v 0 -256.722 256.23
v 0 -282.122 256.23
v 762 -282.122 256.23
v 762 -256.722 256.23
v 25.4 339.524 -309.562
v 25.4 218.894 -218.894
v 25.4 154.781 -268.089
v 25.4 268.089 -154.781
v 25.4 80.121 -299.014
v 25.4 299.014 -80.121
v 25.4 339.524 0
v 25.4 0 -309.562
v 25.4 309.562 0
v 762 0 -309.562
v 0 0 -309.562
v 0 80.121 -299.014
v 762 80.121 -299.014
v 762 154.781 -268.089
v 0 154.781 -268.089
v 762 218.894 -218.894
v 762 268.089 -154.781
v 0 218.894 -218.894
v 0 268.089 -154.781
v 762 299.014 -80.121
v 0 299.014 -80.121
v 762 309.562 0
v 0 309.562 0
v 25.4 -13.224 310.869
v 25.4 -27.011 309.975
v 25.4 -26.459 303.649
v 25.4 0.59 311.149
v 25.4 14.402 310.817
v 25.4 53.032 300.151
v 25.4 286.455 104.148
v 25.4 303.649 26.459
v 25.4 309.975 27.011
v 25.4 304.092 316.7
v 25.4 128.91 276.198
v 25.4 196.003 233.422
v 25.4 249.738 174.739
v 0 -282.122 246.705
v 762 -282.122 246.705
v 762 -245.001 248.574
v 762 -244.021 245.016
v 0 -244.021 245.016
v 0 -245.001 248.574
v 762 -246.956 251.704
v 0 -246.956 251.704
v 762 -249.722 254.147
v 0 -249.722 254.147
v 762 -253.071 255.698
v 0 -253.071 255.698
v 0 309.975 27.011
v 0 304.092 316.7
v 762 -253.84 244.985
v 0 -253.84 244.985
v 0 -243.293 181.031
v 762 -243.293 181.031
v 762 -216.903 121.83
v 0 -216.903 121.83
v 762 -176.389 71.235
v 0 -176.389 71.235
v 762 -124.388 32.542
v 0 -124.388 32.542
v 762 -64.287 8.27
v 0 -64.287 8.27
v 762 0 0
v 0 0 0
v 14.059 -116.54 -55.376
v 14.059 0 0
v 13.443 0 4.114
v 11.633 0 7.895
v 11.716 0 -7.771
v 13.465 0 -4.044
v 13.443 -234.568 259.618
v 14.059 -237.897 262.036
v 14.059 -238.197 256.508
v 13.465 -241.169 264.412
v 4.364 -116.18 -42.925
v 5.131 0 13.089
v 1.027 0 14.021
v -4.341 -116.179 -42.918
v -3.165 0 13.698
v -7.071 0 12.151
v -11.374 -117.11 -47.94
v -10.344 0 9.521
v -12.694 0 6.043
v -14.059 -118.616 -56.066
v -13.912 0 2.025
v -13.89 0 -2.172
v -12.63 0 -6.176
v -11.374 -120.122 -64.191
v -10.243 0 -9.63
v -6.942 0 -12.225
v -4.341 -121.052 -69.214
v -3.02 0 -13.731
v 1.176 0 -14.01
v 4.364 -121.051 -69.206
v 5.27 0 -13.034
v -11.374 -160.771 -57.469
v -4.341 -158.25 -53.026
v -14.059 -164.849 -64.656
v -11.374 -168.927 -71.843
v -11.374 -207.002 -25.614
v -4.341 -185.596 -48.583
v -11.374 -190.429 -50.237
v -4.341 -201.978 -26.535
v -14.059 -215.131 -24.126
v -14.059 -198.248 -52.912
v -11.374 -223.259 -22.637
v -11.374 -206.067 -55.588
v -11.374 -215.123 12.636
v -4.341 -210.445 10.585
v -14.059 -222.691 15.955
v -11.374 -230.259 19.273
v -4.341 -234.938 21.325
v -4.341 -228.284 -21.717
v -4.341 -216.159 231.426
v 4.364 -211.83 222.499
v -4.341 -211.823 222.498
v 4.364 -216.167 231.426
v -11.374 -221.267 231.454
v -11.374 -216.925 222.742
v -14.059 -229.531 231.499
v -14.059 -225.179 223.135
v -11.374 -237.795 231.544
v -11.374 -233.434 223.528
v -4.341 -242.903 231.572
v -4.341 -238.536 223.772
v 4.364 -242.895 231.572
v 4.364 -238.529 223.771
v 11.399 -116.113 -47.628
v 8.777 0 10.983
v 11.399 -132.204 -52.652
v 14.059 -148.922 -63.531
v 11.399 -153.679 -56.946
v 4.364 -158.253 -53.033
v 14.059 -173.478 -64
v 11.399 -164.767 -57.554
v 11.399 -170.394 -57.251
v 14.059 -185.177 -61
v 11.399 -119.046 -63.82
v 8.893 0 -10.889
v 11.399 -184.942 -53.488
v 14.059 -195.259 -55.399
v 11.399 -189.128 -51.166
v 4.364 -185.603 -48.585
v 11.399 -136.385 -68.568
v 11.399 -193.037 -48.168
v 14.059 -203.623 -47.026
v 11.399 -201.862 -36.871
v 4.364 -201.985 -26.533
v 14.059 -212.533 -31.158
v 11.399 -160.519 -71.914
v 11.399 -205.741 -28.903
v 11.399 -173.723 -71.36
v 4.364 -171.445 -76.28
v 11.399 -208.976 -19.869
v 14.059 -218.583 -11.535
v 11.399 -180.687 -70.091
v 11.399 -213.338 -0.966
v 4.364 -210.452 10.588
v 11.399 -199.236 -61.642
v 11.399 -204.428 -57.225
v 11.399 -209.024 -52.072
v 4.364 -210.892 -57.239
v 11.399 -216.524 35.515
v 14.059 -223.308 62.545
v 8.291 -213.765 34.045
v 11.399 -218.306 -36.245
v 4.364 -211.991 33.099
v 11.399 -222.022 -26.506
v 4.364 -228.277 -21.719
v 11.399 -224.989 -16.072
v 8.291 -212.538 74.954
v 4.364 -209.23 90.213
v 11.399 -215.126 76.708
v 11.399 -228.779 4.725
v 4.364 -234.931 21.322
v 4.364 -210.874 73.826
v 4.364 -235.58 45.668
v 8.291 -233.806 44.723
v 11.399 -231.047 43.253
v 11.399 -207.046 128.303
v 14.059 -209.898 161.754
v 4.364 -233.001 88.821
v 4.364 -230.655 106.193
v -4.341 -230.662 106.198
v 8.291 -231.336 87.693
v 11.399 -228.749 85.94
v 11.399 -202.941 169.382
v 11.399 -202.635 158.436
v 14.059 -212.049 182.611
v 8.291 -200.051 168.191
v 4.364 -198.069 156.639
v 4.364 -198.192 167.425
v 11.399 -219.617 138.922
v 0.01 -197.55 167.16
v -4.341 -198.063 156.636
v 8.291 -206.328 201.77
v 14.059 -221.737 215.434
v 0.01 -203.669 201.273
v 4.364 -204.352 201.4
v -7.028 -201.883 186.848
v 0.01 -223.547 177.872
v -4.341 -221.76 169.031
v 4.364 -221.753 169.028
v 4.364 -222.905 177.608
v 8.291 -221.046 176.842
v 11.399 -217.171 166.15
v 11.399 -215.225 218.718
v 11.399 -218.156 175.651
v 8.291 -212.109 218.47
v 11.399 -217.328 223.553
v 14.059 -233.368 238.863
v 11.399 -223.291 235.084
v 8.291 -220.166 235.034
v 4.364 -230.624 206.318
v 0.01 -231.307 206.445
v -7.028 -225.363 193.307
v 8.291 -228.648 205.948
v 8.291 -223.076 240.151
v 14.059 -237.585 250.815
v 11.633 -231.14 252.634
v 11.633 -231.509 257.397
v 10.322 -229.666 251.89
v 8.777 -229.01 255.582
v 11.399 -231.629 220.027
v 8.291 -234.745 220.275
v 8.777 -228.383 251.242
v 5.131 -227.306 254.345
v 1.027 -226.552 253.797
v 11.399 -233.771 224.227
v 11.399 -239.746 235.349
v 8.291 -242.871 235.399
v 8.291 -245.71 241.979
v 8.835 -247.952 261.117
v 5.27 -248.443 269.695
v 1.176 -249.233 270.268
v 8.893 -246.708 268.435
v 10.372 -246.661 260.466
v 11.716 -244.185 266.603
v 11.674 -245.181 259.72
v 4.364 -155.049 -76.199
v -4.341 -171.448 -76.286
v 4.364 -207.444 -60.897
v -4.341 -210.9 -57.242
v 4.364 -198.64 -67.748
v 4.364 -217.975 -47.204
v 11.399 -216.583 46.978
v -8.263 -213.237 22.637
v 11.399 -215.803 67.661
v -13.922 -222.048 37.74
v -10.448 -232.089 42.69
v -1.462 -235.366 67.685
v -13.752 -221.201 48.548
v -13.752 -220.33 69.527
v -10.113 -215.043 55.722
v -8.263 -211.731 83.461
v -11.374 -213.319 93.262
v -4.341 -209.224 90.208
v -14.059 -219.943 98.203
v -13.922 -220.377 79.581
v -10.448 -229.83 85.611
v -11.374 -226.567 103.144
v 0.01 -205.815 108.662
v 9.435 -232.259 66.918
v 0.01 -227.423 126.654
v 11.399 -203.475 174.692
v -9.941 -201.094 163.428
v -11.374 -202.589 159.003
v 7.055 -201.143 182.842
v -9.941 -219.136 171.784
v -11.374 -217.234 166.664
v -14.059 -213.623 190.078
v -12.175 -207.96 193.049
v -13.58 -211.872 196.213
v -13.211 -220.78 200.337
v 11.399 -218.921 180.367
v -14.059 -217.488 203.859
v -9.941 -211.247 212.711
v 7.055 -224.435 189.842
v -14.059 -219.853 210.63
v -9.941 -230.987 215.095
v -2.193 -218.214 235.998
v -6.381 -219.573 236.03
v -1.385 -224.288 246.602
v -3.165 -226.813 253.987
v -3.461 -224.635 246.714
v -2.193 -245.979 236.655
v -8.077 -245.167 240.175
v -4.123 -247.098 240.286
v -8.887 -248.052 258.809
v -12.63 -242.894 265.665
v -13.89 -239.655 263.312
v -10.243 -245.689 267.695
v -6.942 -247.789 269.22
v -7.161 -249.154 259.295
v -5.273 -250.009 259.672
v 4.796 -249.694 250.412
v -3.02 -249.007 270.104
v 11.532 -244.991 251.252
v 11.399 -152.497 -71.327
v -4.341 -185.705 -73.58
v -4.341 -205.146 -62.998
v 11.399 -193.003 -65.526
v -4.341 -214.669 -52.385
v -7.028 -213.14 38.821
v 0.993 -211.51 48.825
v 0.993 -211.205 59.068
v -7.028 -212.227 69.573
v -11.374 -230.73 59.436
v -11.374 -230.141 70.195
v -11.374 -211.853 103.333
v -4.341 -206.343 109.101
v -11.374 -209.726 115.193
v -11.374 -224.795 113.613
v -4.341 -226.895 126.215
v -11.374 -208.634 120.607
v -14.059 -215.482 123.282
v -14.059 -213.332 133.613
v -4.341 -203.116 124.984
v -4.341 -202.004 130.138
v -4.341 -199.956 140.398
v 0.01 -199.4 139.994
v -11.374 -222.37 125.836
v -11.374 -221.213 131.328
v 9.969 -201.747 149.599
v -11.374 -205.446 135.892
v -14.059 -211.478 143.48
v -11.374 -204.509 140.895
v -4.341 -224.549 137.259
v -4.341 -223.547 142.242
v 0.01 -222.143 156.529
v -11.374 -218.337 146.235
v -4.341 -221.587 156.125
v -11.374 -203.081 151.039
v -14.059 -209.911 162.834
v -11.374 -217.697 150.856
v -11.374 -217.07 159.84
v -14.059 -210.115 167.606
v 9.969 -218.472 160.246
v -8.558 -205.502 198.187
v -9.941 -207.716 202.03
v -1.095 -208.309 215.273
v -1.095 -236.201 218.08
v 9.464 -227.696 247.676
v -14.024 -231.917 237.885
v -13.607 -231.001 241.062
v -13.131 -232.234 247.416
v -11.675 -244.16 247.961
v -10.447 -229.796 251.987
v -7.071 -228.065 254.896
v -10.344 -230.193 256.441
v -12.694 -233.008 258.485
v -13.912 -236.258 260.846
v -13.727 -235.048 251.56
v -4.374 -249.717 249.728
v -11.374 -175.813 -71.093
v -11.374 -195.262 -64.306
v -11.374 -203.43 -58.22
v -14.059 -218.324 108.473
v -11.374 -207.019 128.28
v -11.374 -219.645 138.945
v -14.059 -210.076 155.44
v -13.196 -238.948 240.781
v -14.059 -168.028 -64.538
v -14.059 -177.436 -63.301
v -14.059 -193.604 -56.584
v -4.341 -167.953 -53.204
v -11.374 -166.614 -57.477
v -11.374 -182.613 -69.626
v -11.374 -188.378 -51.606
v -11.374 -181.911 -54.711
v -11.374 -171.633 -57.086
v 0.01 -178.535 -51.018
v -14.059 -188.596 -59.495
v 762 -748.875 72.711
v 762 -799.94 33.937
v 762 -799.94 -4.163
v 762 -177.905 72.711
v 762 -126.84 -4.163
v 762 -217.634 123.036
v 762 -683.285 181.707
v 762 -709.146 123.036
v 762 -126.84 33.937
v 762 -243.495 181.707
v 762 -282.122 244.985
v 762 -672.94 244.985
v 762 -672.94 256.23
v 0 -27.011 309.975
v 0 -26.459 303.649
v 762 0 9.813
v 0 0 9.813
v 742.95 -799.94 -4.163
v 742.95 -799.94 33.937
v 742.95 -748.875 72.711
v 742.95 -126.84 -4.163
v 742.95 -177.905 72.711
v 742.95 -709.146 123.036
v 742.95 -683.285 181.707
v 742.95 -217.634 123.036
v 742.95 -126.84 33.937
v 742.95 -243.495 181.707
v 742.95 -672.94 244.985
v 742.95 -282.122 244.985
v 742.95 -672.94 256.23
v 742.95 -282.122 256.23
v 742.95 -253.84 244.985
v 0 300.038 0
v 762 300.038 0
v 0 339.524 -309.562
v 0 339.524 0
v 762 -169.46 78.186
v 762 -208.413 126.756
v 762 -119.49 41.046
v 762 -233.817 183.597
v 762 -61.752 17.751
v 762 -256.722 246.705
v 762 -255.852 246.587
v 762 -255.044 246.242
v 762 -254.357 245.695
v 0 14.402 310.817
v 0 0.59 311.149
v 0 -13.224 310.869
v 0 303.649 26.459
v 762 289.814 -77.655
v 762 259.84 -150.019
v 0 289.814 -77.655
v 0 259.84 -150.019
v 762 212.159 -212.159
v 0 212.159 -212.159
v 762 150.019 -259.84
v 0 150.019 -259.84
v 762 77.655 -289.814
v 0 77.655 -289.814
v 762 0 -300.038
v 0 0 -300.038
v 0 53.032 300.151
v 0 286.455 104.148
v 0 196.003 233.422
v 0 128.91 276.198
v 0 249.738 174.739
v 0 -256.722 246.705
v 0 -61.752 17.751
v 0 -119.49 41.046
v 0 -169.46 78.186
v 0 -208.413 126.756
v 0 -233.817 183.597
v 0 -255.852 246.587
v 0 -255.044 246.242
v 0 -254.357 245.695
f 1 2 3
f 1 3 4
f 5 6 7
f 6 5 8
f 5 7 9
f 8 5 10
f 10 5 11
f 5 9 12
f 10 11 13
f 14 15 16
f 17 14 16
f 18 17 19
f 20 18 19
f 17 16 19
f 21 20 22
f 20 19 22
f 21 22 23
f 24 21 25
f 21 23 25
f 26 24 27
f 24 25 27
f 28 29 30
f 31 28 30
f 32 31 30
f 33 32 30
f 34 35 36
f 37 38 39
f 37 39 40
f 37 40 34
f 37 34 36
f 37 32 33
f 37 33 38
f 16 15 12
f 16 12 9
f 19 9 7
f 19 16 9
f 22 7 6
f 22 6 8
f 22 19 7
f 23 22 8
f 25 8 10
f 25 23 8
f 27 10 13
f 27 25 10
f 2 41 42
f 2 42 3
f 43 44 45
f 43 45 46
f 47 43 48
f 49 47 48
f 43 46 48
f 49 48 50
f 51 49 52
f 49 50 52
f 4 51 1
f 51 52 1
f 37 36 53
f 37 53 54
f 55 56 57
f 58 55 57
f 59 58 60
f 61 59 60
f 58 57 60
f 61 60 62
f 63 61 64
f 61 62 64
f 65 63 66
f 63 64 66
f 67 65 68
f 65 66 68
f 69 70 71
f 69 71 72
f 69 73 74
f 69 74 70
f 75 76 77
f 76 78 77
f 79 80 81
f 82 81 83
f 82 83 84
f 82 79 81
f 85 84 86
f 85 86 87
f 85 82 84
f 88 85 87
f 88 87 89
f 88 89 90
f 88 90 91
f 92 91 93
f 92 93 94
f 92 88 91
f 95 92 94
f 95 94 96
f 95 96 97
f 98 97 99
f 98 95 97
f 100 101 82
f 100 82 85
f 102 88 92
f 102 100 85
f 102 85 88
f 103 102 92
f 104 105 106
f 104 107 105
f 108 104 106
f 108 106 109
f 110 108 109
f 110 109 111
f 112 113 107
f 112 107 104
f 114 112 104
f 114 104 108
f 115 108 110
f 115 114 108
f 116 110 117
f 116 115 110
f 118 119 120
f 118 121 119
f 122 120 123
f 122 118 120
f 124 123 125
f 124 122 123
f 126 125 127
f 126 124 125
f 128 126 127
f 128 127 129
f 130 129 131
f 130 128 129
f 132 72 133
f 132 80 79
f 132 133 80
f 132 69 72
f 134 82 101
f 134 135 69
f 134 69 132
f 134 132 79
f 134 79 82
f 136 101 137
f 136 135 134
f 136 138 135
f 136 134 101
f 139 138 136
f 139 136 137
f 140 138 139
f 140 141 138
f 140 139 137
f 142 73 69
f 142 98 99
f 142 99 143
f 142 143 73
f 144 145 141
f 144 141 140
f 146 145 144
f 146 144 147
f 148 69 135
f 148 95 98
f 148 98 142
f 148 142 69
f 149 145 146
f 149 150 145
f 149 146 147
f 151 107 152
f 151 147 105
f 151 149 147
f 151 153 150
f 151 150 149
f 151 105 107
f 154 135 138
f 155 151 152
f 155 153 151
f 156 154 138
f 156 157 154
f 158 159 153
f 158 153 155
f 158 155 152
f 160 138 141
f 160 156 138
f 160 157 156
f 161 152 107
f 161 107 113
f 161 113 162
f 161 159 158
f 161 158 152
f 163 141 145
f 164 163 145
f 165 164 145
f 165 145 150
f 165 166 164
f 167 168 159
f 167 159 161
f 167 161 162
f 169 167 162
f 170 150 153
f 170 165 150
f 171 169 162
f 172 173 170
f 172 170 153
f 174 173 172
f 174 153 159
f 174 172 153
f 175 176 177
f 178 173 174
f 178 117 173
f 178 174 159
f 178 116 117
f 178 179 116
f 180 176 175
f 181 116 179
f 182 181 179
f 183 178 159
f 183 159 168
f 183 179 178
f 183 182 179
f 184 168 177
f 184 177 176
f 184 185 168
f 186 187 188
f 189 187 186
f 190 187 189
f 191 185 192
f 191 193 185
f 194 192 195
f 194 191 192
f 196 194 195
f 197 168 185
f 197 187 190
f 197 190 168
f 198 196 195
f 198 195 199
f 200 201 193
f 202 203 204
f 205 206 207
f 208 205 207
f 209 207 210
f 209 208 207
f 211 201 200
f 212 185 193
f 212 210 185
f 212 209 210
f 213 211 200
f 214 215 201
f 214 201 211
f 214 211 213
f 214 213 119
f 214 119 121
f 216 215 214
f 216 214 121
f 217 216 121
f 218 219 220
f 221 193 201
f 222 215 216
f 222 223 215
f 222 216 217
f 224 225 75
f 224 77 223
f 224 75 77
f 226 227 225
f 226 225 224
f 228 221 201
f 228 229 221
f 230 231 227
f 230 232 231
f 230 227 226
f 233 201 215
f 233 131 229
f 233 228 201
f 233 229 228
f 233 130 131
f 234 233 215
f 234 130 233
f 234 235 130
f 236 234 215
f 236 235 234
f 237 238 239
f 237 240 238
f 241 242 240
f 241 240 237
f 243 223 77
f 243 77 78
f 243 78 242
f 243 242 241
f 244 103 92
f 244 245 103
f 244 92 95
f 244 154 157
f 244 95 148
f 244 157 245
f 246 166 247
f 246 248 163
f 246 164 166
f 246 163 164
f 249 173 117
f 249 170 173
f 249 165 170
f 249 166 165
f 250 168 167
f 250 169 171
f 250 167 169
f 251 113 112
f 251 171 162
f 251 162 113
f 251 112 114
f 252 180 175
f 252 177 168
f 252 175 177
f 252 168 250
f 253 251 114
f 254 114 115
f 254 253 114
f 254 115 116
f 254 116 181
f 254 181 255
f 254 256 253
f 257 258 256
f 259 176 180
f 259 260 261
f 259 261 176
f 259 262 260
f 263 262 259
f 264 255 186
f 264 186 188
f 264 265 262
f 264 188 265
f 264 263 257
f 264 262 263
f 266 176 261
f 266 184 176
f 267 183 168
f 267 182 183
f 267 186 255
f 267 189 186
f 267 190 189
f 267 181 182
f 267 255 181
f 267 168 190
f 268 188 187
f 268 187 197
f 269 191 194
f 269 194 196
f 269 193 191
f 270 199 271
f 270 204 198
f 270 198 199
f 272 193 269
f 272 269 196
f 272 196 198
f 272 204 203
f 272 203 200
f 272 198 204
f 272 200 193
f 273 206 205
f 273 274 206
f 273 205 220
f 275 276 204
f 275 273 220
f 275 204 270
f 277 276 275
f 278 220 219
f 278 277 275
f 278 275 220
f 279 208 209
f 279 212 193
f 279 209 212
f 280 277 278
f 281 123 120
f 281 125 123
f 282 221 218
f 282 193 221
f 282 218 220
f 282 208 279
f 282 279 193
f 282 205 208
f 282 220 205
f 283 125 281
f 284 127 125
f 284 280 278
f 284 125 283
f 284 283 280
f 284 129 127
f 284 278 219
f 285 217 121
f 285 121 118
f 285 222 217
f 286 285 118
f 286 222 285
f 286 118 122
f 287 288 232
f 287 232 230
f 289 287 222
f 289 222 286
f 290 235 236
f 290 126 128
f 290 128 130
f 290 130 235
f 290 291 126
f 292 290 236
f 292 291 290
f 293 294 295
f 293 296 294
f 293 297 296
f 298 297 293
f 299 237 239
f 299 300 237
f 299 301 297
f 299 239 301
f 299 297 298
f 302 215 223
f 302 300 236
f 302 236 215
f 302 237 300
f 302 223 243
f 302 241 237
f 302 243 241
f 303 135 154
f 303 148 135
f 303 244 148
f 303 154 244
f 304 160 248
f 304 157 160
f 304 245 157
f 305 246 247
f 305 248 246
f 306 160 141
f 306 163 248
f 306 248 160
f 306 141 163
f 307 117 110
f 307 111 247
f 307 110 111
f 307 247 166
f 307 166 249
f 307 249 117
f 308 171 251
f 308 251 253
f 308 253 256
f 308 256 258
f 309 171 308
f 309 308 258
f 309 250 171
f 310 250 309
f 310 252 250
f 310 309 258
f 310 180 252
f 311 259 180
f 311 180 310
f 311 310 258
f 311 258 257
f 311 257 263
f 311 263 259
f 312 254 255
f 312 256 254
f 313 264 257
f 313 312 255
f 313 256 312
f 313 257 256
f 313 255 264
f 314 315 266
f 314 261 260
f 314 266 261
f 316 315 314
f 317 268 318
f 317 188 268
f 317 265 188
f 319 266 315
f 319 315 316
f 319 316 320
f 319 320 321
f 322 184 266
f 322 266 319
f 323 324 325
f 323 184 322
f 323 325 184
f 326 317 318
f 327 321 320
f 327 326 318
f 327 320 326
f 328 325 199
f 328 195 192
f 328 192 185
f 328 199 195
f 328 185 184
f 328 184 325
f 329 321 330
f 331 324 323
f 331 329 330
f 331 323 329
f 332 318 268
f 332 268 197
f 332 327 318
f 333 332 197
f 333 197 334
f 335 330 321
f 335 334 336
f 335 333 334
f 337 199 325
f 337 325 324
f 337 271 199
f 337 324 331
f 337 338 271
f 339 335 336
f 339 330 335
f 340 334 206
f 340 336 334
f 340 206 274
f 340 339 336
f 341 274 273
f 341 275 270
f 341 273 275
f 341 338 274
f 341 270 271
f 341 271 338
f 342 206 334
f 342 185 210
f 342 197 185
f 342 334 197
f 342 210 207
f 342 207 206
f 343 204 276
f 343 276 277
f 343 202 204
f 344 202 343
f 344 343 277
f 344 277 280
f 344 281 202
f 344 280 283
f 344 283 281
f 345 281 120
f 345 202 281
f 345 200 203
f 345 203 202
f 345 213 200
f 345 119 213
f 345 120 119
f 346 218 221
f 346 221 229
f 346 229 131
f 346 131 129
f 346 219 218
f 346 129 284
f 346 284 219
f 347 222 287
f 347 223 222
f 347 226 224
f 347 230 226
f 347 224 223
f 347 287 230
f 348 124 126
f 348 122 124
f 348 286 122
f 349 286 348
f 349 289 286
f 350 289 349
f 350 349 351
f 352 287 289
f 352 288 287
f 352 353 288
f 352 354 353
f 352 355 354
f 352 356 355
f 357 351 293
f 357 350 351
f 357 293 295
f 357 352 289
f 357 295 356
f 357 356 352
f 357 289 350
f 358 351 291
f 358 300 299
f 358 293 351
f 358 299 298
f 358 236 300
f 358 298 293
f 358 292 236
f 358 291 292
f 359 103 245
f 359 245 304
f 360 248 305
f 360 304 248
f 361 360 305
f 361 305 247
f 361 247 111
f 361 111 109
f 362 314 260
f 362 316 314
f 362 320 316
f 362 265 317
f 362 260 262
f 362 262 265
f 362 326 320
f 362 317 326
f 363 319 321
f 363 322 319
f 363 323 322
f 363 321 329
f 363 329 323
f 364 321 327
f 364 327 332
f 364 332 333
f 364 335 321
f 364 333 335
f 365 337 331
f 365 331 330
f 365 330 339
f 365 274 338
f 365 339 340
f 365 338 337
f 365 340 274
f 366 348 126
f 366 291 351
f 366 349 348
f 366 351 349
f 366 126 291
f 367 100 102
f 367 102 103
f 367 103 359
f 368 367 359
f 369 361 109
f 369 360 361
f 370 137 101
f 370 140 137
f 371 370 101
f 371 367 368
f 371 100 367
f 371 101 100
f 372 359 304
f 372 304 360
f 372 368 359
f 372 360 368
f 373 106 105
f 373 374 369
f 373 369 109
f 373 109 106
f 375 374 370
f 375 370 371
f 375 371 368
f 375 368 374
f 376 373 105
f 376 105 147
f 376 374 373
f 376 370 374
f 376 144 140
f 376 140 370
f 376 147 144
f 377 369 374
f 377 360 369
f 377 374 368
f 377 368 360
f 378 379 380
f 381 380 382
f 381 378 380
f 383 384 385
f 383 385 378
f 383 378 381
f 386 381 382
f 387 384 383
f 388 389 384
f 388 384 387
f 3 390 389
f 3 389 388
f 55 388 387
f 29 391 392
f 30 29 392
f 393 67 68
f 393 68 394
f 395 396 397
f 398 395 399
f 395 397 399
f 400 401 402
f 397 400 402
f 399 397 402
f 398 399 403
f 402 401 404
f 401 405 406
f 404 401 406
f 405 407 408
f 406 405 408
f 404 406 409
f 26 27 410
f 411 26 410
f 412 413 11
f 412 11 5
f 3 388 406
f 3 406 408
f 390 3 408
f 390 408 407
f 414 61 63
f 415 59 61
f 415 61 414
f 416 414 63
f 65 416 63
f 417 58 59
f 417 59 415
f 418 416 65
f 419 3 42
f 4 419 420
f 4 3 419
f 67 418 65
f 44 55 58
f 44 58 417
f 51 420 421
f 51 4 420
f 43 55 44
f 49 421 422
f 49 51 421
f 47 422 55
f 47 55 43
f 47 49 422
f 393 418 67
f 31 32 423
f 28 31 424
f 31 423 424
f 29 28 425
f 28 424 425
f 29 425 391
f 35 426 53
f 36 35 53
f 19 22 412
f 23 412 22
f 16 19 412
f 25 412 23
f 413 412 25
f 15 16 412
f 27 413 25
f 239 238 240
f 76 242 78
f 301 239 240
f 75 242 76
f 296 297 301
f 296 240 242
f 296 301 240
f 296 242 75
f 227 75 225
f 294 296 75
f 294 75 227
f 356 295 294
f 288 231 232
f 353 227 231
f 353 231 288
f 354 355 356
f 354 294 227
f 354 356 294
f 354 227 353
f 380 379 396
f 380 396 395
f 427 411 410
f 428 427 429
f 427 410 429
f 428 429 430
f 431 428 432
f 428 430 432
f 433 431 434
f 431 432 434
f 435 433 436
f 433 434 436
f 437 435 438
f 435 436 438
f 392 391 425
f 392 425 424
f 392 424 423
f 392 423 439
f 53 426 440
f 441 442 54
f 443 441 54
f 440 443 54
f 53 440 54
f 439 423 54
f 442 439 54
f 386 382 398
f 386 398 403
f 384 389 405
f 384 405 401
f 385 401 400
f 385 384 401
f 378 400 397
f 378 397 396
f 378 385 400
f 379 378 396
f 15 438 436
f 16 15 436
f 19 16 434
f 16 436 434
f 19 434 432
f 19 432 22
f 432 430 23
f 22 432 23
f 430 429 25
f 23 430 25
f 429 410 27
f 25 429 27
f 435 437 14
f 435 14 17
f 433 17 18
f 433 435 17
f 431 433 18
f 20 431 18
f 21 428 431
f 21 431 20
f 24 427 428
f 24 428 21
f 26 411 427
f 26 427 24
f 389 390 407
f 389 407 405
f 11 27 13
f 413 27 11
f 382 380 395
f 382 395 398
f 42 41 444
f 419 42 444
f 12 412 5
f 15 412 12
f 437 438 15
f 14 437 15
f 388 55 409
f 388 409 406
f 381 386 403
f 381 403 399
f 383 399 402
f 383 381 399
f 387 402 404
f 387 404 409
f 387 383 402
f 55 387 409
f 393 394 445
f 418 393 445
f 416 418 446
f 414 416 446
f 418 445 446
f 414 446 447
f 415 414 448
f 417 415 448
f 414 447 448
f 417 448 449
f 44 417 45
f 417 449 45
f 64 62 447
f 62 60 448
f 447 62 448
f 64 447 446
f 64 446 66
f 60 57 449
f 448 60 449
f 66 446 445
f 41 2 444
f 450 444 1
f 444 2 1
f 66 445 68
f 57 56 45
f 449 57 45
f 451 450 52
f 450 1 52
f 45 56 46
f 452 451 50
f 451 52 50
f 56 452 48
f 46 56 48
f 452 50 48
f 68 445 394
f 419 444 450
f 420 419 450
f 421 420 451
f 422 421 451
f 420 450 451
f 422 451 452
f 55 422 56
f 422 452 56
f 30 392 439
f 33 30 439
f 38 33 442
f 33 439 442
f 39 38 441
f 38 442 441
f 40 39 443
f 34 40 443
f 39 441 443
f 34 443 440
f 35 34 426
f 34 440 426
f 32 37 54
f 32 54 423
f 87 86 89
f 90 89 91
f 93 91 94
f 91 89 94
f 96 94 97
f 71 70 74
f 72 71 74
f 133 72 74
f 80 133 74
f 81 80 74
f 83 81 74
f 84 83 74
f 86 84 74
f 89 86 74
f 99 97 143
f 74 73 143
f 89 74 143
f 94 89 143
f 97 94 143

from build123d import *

# Parameters (mm, degrees)
F1_DEPTH  = 762
F3_DEPTH  = 25.4
F5_DEPTH  = 25.4
F7_R      = 14.058836882
F10_DEPTH = 25.4
F11_W     = 25.4
F11_H     = 9.525
F12_DEPTH = 762
F14_DEPTH = 19.05


with BuildPart() as f1:
    # F0 (on Right) → F1 (new body)
    with BuildSketch(Plane.YZ):
        with BuildLine():
            Line((309.5625, 0), (300.0375, 0))
            ThreePointArc((300.0375, 0), (212.1585508603, -212.1585508603), (0, -300.0375))
            Line((0, -300.0375), (0, -309.5625))
            ThreePointArc((0, -309.5625), (218.8937429511, -218.8937429511), (309.5625, 0))
        make_face()
    extrude(amount=F1_DEPTH)


with BuildPart() as f3:
    # F2 (on Right) → F3 (new body)
    with BuildSketch(Plane.YZ):
        with BuildLine():
            ThreePointArc((-26.4594648625, 303.6493647601), (196.002857894, 233.4221919557), (303.6493647601, 26.4594648625))
            Line((303.6493647601, 26.4594648625), (309.9753931926, 27.0107037138))
            ThreePointArc((309.9753931926, 27.0107037138), (200.0862507668, 238.2851542881), (-27.0107037138, 309.9753931926))
            Line((-27.0107037138, 309.9753931926), (-26.4594648625, 303.6493647601))
        make_face()
    extrude(amount=F3_DEPTH)

    # F4 (on face) → F5 (join)
    with BuildSketch(Plane.YZ.offset(25.4)):
        with BuildLine():
            ThreePointArc((14.4017959028, 310.8165226863), (215.5030763632, 224.4387368036), (309.9753931926, 27.0107037138))
            Line((309.9753931926, 27.0107037138), (304.0915040339, 316.7004118449))
            Line((304.0915040339, 316.7004118449), (14.4017959028, 310.8165226863))
        make_face()
    extrude(amount=-F5_DEPTH)


with BuildPart() as f8:
    # F8: sweep along a path in F6
    with BuildLine(Plane.YZ) as f8_path:
        add(Plane.YZ * Edge.make_bspline(
            [(0, 0), (-86.5811547172, -47.2866635671), (-230.1175587572, -116.7563055821), (-225.2096979585, 104.5112167582), (-203.5154602271, 157.8235998858), (-222.1693528222, 225.2381372065), (-239.8794464893, 246.6602765606), (-237.8969937563, 262.0359957218)],
            knots=[0, 0, 0, 0, 0.2920252666, 0.5439171262, 0.7087896431, 0.8695782154, 1, 1, 1, 1], degree=3))
    # F7 (on Front) → F8 (sweep)
    with BuildSketch(Plane.XZ):
        Circle(F7_R)
    sweep(path=f8_path.line)


with BuildPart() as f10:
    # F9 (on face) → F10 (new body)
    with BuildSketch(Plane(origin=(0, 0, 0), x_dir=(0, -1, 0), z_dir=(-1, 0, 0))):
        with BuildLine():
            Line((-339.5244552609, -309.5625), (0, -309.5625))
            ThreePointArc((0, -309.5625), (-218.8937429511, -218.8937429511), (-309.5625, 0))
            Line((-309.5625, 0), (-339.5244552609, 0))
            Line((-339.5244552609, 0), (-339.5244552609, -309.5625))
        make_face()
    extrude(amount=-F10_DEPTH)


with BuildPart() as f12:
    # F11 (on Right) → F12 (new body)
    with BuildSketch(Plane.YZ):
        with BuildLine():
            Line((-244.0212887158, 245.0157544993), (-253.8399534826, 244.9845679012))
            ThreePointArc((-253.8399534826, 244.9845679012), (-176.3888888889, 71.2352334925), (0, 0))
            Line((0, 0), (0, 9.8133787167))
            ThreePointArc((0, 9.8133787167), (-169.4598381036, 78.1862653725), (-244.0212887158, 245.0157544993))
        make_face()
        with BuildLine():
            ThreePointArc((-256.722471, 246.7052992387), (-255.0439431053, 246.242399709), (-253.8399534826, 244.9845679012))
            Line((-253.8399534826, 244.9845679012), (-244.0212887158, 245.0157544993))
            ThreePointArc((-244.0212887158, 245.0157544993), (-248.2506641513, 253.0254380217), (-256.722471, 256.2302992387))
            Line((-256.722471, 256.2302992387), (-256.722471, 246.7052992387))
        make_face()
        with Locations((-269.422471, 251.4677992387)):
            Rectangle(F11_W, F11_H)
    extrude(amount=F12_DEPTH)


with BuildPart() as f14:
    # F13 (on face) → F14 (new body)
    with BuildSketch(Plane.YZ.offset(762)):
        with BuildLine():
            ThreePointArc((-126.8399534826, 33.9372221376), (-217.633966628, 123.0364303718), (-253.8399534826, 244.9845679012))
            Line((-253.8399534826, 244.9845679012), (-253.8399534826, -4.1627778624))
            Line((-253.8399534826, -4.1627778624), (-126.8399534826, -4.1627778624))
            Line((-126.8399534826, -4.1627778624), (-126.8399534826, 33.9372221376))
        make_face()
        Polygon((-253.8399534826, -4.1627778624), (-253.8399534826, 244.9845679012), (-282.122471, 244.9845679012), (-282.122471, 256.2302992387), (-463.3899534826, 256.2302992387), (-463.3899534826, -4.1627778624), align=None)
        Polygon((-672.9399534826, -4.1627778624), (-463.3899534826, -4.1627778624), (-463.3899534826, 256.2302992387), (-644.6574359654, 256.2302992387), (-672.9399534826, 256.2302992387), (-672.9399534826, 244.9845679012), align=None)
        with BuildLine():
            Line((-799.9399534826, -4.1627778624), (-672.9399534826, -4.1627778624))
            Line((-672.9399534826, -4.1627778624), (-672.9399534826, 244.9845679012))
            ThreePointArc((-672.9399534826, 244.9845679012), (-709.1459403373, 123.0364303718), (-799.9399534826, 33.9372221376))
            Line((-799.9399534826, 33.9372221376), (-799.9399534826, -4.1627778624))
        make_face()
        Polygon((-253.8399534826, -4.1627778624), (-253.8399534826, 244.9845679012), (-282.122471, 244.9845679012), (-282.122471, 246.7052992387), (-282.122471, 256.2302992387), (-463.3899534826, 256.2302992387), (-463.3899534826, -4.1627778624), align=None)
    extrude(amount=-F14_DEPTH)


solid = Compound([f1.part, f3.part, f8.part, f10.part, f12.part, f14.part])
